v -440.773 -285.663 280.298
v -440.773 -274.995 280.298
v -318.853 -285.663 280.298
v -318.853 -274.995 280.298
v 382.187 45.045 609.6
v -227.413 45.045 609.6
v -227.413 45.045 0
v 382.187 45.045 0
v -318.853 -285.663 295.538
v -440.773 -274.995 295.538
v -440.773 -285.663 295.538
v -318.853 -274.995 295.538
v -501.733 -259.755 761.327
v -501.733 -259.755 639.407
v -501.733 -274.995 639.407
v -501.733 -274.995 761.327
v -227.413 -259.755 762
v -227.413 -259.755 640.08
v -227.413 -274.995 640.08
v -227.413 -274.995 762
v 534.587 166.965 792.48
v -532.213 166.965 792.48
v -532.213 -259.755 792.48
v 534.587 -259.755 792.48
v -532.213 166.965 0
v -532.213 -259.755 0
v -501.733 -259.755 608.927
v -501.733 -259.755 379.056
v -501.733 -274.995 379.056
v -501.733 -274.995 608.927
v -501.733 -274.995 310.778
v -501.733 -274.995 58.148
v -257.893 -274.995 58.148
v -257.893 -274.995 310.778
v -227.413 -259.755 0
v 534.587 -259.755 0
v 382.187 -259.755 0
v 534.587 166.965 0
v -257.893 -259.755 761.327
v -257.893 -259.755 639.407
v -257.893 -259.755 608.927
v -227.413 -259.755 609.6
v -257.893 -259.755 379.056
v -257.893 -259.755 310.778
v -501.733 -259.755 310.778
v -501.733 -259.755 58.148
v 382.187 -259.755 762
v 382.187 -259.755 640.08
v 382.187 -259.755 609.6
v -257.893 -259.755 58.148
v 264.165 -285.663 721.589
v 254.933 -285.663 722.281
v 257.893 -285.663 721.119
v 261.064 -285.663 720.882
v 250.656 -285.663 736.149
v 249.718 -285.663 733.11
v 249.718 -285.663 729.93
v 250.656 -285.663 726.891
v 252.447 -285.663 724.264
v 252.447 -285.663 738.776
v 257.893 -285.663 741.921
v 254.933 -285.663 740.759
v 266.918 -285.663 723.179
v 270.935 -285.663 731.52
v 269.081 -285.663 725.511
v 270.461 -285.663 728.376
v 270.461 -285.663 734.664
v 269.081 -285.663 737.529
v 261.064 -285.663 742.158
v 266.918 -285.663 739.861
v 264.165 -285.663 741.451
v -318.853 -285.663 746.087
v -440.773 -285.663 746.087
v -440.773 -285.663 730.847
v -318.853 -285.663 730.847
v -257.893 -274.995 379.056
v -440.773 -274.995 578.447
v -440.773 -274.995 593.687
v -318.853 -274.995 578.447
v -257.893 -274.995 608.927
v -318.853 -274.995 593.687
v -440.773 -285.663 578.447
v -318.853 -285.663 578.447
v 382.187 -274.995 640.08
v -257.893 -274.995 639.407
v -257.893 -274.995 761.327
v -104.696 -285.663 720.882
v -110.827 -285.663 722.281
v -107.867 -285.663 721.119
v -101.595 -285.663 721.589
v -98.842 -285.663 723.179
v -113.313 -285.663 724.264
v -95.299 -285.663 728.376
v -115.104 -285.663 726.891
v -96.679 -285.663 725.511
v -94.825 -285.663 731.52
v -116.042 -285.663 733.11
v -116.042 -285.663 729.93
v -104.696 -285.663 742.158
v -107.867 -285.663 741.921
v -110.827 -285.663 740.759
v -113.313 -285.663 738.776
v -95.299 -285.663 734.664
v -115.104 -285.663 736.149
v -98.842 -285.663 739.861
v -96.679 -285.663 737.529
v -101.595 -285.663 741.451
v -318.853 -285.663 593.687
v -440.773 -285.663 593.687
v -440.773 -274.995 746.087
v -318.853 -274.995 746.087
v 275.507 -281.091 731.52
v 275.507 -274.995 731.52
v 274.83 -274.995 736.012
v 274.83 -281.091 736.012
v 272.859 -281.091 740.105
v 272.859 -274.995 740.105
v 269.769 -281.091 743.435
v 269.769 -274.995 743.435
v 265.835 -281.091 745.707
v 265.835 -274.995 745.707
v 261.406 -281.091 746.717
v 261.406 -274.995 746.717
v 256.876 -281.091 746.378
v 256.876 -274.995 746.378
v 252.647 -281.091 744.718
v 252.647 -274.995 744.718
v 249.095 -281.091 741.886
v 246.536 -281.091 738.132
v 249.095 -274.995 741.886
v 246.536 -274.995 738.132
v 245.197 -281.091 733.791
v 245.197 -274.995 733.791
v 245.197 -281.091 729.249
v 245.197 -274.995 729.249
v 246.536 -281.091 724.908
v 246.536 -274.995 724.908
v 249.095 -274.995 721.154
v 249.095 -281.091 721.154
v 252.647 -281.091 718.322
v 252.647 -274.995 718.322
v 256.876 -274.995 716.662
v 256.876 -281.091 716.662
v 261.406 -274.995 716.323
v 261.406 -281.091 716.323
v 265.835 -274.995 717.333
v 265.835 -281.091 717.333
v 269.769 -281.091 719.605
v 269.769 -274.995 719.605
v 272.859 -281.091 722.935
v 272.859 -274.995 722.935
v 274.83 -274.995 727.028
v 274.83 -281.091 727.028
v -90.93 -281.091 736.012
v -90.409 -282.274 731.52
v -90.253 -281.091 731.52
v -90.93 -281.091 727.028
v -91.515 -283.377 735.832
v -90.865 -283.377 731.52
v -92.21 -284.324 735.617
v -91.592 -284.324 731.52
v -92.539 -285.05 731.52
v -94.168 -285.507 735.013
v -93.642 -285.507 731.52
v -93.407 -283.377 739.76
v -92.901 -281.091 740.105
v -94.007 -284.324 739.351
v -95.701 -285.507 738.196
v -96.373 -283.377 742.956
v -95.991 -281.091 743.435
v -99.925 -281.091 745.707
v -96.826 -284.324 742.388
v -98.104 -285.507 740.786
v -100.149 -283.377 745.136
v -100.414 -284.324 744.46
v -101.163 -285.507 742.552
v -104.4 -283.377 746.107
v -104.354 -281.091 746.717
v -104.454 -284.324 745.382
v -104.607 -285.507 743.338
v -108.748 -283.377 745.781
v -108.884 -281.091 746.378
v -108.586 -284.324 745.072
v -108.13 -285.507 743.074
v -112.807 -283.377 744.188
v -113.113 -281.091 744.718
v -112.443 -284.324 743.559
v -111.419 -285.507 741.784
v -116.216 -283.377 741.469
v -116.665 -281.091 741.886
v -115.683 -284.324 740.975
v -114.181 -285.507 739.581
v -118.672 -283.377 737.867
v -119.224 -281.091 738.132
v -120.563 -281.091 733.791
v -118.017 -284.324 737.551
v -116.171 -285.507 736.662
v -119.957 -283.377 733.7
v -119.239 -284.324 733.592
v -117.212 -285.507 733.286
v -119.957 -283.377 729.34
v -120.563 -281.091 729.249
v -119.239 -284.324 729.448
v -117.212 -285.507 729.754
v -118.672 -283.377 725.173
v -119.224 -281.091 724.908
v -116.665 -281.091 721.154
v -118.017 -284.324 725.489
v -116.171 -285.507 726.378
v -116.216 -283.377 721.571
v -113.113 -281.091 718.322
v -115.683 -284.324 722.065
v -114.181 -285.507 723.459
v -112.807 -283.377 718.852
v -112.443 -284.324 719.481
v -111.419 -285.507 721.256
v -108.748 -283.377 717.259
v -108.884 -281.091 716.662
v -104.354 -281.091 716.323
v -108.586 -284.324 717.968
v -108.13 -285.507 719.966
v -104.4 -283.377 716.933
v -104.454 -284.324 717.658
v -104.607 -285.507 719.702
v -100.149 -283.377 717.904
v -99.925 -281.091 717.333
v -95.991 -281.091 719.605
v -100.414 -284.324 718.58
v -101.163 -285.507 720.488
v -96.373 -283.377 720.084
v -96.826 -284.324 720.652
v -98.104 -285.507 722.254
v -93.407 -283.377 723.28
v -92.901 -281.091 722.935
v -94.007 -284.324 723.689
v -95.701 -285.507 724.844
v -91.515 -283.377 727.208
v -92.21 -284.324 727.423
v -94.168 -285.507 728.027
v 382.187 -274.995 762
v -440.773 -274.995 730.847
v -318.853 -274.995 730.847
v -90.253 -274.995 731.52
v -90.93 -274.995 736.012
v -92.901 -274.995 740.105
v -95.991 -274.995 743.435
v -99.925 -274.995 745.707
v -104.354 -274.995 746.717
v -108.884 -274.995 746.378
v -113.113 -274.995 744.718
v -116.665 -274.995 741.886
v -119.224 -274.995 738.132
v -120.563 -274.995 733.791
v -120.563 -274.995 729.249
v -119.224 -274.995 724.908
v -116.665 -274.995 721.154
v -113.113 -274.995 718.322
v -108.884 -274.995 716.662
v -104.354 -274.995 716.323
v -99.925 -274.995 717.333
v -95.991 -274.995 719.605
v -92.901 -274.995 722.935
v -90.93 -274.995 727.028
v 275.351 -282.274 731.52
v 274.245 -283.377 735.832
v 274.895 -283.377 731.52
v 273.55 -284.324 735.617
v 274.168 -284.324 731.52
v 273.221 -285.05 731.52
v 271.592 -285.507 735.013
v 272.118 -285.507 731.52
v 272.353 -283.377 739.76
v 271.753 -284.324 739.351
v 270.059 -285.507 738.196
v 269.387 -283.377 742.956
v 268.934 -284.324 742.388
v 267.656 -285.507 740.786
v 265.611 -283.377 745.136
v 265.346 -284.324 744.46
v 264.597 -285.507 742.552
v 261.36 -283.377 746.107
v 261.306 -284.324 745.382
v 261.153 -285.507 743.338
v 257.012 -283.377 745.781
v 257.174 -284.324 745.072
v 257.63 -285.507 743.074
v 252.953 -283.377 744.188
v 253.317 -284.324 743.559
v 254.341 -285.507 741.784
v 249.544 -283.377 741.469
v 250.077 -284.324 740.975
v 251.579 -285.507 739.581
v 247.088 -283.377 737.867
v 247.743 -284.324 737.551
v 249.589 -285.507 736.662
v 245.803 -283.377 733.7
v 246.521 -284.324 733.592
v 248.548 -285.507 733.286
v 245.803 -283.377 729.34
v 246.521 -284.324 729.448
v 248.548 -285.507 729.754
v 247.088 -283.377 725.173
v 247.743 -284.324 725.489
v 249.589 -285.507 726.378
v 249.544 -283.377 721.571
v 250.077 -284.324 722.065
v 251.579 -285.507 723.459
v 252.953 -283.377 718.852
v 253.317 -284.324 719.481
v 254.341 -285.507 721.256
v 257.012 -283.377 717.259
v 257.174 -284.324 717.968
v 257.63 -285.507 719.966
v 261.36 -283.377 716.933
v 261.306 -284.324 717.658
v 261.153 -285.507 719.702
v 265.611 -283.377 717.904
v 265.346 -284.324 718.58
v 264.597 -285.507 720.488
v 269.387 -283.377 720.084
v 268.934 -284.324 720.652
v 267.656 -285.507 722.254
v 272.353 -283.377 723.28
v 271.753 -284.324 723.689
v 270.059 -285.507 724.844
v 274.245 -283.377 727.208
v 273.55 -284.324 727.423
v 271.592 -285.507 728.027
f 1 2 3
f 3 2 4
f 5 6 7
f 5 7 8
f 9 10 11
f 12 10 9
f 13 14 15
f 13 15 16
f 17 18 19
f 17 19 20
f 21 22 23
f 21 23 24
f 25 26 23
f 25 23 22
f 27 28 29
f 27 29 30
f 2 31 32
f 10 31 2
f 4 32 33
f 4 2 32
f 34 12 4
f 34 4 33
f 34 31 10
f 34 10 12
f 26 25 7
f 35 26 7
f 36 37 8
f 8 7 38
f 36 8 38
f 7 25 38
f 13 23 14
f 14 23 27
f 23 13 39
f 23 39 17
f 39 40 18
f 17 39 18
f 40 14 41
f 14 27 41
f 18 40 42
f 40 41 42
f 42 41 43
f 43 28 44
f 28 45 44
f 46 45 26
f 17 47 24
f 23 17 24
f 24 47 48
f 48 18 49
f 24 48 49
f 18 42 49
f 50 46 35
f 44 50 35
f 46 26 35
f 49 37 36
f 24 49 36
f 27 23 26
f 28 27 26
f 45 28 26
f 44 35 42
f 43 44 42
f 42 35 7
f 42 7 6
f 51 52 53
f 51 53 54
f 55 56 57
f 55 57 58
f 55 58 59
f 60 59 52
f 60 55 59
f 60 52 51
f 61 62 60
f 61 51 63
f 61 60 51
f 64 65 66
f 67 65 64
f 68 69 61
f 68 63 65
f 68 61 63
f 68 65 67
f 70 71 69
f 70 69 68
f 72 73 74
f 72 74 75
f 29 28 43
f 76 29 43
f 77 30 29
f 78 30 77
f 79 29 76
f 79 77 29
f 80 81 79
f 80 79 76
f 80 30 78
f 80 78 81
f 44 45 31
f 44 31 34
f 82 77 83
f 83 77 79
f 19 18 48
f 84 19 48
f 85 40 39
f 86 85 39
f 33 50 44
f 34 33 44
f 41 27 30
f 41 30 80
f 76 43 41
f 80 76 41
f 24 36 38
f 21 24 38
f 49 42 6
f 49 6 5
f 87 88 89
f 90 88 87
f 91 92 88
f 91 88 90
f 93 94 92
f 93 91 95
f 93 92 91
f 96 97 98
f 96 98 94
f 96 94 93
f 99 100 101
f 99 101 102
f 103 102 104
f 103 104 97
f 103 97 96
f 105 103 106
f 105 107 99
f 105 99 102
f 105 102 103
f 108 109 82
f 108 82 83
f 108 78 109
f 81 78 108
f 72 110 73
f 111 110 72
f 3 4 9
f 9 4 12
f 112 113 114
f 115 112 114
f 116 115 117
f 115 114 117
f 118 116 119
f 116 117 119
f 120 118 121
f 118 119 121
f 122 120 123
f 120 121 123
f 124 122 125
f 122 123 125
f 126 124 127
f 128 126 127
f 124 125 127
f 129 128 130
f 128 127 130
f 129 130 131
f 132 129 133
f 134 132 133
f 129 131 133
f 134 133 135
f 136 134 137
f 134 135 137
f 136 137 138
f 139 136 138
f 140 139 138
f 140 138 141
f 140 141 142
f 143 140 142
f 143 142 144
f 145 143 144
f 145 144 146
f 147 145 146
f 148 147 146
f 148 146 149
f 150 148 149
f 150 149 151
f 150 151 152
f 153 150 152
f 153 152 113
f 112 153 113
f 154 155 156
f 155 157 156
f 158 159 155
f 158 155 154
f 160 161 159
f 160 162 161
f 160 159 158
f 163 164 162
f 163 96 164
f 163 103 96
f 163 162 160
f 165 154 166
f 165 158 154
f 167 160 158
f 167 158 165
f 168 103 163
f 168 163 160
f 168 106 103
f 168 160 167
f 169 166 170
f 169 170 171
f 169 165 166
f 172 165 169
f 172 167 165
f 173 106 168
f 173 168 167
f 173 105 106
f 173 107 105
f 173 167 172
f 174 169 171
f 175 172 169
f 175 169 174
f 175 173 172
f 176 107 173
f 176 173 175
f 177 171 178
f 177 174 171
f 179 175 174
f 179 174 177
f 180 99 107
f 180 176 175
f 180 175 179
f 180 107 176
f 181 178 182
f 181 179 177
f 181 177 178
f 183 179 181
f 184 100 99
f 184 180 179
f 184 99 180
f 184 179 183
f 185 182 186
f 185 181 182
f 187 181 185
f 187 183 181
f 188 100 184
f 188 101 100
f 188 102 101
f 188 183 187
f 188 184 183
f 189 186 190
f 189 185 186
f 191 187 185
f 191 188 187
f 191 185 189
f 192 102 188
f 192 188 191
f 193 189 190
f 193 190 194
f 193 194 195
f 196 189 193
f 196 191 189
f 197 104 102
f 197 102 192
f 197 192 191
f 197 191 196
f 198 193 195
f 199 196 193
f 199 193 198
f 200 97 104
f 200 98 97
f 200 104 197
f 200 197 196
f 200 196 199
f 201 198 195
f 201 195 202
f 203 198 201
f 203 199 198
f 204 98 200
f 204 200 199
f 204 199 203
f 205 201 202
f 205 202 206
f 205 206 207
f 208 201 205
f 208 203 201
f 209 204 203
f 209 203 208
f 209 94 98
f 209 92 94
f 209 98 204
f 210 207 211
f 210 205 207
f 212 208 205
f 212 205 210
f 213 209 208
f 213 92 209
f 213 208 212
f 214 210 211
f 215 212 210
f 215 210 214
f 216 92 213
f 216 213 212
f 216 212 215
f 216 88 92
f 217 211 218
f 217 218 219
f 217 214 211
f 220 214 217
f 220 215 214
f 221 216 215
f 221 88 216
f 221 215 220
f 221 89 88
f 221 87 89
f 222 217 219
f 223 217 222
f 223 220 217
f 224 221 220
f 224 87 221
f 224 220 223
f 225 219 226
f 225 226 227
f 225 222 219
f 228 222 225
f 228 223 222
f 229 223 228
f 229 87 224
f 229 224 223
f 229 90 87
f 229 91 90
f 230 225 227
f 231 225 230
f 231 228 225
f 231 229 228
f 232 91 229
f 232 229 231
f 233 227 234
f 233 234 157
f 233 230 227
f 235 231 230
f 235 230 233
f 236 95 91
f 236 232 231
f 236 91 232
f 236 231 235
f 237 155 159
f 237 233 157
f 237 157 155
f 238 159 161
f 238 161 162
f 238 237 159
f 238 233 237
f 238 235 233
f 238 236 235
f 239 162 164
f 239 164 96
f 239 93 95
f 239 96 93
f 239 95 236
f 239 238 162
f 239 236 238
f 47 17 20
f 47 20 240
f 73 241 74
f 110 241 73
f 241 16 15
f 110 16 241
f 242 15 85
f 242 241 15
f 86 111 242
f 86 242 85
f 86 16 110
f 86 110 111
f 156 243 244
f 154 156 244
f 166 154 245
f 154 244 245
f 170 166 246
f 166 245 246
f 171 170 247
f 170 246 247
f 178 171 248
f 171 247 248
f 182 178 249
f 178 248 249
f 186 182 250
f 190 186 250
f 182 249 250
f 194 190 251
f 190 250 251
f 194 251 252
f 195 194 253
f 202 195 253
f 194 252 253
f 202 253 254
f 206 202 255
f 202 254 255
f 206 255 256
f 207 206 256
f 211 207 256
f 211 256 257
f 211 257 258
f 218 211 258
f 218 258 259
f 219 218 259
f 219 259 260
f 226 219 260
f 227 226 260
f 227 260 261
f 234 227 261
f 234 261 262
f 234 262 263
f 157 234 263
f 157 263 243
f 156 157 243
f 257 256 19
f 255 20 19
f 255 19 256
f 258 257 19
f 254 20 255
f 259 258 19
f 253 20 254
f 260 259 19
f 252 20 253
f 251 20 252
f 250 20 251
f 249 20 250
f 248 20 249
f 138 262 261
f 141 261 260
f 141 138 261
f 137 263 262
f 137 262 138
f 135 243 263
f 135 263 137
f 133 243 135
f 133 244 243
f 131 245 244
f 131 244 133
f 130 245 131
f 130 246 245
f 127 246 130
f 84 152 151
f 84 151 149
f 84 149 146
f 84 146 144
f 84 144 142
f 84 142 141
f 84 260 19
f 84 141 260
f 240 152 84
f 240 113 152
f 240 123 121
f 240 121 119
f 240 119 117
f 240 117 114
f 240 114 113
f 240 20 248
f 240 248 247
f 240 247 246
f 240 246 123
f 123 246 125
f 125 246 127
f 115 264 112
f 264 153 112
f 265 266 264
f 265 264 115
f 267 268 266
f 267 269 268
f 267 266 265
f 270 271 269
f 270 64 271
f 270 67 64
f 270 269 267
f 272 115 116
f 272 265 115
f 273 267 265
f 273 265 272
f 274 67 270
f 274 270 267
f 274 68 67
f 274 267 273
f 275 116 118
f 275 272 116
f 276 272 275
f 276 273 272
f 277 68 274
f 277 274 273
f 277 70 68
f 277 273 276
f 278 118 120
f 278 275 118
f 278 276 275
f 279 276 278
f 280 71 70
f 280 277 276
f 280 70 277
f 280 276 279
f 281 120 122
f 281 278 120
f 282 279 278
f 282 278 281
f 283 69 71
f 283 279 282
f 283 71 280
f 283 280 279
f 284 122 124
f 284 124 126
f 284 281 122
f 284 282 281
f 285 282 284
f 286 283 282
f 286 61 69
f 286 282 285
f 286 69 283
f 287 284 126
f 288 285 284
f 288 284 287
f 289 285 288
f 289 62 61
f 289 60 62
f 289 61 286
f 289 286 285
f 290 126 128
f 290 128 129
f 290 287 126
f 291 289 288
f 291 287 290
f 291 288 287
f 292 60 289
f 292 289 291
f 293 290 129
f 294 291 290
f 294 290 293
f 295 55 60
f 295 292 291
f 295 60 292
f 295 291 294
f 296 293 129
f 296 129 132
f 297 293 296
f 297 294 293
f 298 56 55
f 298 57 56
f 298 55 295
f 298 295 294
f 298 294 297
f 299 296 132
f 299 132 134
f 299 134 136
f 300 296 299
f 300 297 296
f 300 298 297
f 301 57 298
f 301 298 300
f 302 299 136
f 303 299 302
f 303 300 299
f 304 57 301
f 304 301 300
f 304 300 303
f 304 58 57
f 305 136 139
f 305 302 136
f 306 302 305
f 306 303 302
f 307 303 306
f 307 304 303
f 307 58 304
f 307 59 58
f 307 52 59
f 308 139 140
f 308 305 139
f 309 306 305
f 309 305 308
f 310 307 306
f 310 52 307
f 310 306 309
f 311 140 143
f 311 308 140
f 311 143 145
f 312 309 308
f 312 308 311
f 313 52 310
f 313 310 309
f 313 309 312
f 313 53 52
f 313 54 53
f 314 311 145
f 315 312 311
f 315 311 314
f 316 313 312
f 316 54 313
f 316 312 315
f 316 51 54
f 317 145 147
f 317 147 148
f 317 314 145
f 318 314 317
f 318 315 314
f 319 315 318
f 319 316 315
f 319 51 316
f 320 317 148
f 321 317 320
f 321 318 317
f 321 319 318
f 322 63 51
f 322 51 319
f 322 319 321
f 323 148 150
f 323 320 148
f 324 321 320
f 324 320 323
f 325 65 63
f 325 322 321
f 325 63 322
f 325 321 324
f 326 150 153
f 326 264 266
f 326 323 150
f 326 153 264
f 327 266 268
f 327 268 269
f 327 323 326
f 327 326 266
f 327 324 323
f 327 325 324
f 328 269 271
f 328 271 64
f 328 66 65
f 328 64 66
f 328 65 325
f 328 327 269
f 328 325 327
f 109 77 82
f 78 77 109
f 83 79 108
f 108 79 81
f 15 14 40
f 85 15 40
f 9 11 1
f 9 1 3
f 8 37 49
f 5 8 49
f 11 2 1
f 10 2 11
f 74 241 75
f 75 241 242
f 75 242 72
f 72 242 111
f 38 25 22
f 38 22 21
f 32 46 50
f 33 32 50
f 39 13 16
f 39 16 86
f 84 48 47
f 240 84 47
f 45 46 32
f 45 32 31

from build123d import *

# Parameters (mm, degrees)
F0_W     = 1066.8
F0_H     = 426.72
F1_DEPTH = 792.48
F2_W     = 609.6
F2_H     = 609.6
F3_DEPTH = 304.8
F4_W     = 609.6
F4_H     = 121.92
F4_W_2   = 243.84
F4_H_2   = 229.870439
F4_H_3   = 252.629858
F5_DEPTH = 15.24
F6_W     = 121.92
F6_H     = 15.24
F6_R     = 15.24
F7_DEPTH = 25.908
F8_R     = 4.572


with BuildPart() as f1:
    # F0 (on Top) → F1 (new body)
    with BuildSketch(Plane.XY):
        with Locations((1.187092, -46.394789)):
            Rectangle(F0_W, F0_H)
    extrude(amount=F1_DEPTH)

    # F2 (on face) → F3 (cut)
    with BuildSketch(Plane.XZ.offset(259.754789)):
        with Locations((77.387092, 304.8)):
            Rectangle(F2_W, F2_H)
    extrude(amount=-F3_DEPTH, mode=Mode.SUBTRACT)

    # F4 (on face) → F5 (join)
    with BuildSketch(Plane.XZ.offset(259.754789)):
        with Locations((77.387092, 701.04)):
            Rectangle(F4_W, F4_H)
        with Locations((-379.812908, 700.366654)):
            Rectangle(F4_W_2, F4_H)
        with Locations((-379.812908, 493.991434)):
            Rectangle(F4_W_2, F4_H_2)
        with Locations((-379.812908, 184.462944)):
            Rectangle(F4_W_2, F4_H_3)
    extrude(amount=F5_DEPTH)

    # F6 (on face) → F7 (join)
    with BuildSketch(Plane.XZ.offset(259.754789)):
        with Locations((-379.812908, 738.466654)):
            Rectangle(F6_W, F6_H)
        with Locations((-379.812908, 586.066654)):
            Rectangle(F6_W, F6_H)
        with Locations((-379.812908, 287.917873)):
            Rectangle(F6_W, F6_H)
        with Locations((-105.492908, 731.52)):
            Circle(F6_R)
        with Locations((260.267092, 731.52)):
            Circle(F6_R)
    extrude(amount=F7_DEPTH)

    # F8
    f8_edges = [f1.edges().sort_by_distance(p)[0] for p in [
        (-120.732908, -285.662789, 731.52),
        (245.027092, -285.662789, 731.52),
    ]]
    fillet(f8_edges, radius=F8_R)


solid = f1.part
